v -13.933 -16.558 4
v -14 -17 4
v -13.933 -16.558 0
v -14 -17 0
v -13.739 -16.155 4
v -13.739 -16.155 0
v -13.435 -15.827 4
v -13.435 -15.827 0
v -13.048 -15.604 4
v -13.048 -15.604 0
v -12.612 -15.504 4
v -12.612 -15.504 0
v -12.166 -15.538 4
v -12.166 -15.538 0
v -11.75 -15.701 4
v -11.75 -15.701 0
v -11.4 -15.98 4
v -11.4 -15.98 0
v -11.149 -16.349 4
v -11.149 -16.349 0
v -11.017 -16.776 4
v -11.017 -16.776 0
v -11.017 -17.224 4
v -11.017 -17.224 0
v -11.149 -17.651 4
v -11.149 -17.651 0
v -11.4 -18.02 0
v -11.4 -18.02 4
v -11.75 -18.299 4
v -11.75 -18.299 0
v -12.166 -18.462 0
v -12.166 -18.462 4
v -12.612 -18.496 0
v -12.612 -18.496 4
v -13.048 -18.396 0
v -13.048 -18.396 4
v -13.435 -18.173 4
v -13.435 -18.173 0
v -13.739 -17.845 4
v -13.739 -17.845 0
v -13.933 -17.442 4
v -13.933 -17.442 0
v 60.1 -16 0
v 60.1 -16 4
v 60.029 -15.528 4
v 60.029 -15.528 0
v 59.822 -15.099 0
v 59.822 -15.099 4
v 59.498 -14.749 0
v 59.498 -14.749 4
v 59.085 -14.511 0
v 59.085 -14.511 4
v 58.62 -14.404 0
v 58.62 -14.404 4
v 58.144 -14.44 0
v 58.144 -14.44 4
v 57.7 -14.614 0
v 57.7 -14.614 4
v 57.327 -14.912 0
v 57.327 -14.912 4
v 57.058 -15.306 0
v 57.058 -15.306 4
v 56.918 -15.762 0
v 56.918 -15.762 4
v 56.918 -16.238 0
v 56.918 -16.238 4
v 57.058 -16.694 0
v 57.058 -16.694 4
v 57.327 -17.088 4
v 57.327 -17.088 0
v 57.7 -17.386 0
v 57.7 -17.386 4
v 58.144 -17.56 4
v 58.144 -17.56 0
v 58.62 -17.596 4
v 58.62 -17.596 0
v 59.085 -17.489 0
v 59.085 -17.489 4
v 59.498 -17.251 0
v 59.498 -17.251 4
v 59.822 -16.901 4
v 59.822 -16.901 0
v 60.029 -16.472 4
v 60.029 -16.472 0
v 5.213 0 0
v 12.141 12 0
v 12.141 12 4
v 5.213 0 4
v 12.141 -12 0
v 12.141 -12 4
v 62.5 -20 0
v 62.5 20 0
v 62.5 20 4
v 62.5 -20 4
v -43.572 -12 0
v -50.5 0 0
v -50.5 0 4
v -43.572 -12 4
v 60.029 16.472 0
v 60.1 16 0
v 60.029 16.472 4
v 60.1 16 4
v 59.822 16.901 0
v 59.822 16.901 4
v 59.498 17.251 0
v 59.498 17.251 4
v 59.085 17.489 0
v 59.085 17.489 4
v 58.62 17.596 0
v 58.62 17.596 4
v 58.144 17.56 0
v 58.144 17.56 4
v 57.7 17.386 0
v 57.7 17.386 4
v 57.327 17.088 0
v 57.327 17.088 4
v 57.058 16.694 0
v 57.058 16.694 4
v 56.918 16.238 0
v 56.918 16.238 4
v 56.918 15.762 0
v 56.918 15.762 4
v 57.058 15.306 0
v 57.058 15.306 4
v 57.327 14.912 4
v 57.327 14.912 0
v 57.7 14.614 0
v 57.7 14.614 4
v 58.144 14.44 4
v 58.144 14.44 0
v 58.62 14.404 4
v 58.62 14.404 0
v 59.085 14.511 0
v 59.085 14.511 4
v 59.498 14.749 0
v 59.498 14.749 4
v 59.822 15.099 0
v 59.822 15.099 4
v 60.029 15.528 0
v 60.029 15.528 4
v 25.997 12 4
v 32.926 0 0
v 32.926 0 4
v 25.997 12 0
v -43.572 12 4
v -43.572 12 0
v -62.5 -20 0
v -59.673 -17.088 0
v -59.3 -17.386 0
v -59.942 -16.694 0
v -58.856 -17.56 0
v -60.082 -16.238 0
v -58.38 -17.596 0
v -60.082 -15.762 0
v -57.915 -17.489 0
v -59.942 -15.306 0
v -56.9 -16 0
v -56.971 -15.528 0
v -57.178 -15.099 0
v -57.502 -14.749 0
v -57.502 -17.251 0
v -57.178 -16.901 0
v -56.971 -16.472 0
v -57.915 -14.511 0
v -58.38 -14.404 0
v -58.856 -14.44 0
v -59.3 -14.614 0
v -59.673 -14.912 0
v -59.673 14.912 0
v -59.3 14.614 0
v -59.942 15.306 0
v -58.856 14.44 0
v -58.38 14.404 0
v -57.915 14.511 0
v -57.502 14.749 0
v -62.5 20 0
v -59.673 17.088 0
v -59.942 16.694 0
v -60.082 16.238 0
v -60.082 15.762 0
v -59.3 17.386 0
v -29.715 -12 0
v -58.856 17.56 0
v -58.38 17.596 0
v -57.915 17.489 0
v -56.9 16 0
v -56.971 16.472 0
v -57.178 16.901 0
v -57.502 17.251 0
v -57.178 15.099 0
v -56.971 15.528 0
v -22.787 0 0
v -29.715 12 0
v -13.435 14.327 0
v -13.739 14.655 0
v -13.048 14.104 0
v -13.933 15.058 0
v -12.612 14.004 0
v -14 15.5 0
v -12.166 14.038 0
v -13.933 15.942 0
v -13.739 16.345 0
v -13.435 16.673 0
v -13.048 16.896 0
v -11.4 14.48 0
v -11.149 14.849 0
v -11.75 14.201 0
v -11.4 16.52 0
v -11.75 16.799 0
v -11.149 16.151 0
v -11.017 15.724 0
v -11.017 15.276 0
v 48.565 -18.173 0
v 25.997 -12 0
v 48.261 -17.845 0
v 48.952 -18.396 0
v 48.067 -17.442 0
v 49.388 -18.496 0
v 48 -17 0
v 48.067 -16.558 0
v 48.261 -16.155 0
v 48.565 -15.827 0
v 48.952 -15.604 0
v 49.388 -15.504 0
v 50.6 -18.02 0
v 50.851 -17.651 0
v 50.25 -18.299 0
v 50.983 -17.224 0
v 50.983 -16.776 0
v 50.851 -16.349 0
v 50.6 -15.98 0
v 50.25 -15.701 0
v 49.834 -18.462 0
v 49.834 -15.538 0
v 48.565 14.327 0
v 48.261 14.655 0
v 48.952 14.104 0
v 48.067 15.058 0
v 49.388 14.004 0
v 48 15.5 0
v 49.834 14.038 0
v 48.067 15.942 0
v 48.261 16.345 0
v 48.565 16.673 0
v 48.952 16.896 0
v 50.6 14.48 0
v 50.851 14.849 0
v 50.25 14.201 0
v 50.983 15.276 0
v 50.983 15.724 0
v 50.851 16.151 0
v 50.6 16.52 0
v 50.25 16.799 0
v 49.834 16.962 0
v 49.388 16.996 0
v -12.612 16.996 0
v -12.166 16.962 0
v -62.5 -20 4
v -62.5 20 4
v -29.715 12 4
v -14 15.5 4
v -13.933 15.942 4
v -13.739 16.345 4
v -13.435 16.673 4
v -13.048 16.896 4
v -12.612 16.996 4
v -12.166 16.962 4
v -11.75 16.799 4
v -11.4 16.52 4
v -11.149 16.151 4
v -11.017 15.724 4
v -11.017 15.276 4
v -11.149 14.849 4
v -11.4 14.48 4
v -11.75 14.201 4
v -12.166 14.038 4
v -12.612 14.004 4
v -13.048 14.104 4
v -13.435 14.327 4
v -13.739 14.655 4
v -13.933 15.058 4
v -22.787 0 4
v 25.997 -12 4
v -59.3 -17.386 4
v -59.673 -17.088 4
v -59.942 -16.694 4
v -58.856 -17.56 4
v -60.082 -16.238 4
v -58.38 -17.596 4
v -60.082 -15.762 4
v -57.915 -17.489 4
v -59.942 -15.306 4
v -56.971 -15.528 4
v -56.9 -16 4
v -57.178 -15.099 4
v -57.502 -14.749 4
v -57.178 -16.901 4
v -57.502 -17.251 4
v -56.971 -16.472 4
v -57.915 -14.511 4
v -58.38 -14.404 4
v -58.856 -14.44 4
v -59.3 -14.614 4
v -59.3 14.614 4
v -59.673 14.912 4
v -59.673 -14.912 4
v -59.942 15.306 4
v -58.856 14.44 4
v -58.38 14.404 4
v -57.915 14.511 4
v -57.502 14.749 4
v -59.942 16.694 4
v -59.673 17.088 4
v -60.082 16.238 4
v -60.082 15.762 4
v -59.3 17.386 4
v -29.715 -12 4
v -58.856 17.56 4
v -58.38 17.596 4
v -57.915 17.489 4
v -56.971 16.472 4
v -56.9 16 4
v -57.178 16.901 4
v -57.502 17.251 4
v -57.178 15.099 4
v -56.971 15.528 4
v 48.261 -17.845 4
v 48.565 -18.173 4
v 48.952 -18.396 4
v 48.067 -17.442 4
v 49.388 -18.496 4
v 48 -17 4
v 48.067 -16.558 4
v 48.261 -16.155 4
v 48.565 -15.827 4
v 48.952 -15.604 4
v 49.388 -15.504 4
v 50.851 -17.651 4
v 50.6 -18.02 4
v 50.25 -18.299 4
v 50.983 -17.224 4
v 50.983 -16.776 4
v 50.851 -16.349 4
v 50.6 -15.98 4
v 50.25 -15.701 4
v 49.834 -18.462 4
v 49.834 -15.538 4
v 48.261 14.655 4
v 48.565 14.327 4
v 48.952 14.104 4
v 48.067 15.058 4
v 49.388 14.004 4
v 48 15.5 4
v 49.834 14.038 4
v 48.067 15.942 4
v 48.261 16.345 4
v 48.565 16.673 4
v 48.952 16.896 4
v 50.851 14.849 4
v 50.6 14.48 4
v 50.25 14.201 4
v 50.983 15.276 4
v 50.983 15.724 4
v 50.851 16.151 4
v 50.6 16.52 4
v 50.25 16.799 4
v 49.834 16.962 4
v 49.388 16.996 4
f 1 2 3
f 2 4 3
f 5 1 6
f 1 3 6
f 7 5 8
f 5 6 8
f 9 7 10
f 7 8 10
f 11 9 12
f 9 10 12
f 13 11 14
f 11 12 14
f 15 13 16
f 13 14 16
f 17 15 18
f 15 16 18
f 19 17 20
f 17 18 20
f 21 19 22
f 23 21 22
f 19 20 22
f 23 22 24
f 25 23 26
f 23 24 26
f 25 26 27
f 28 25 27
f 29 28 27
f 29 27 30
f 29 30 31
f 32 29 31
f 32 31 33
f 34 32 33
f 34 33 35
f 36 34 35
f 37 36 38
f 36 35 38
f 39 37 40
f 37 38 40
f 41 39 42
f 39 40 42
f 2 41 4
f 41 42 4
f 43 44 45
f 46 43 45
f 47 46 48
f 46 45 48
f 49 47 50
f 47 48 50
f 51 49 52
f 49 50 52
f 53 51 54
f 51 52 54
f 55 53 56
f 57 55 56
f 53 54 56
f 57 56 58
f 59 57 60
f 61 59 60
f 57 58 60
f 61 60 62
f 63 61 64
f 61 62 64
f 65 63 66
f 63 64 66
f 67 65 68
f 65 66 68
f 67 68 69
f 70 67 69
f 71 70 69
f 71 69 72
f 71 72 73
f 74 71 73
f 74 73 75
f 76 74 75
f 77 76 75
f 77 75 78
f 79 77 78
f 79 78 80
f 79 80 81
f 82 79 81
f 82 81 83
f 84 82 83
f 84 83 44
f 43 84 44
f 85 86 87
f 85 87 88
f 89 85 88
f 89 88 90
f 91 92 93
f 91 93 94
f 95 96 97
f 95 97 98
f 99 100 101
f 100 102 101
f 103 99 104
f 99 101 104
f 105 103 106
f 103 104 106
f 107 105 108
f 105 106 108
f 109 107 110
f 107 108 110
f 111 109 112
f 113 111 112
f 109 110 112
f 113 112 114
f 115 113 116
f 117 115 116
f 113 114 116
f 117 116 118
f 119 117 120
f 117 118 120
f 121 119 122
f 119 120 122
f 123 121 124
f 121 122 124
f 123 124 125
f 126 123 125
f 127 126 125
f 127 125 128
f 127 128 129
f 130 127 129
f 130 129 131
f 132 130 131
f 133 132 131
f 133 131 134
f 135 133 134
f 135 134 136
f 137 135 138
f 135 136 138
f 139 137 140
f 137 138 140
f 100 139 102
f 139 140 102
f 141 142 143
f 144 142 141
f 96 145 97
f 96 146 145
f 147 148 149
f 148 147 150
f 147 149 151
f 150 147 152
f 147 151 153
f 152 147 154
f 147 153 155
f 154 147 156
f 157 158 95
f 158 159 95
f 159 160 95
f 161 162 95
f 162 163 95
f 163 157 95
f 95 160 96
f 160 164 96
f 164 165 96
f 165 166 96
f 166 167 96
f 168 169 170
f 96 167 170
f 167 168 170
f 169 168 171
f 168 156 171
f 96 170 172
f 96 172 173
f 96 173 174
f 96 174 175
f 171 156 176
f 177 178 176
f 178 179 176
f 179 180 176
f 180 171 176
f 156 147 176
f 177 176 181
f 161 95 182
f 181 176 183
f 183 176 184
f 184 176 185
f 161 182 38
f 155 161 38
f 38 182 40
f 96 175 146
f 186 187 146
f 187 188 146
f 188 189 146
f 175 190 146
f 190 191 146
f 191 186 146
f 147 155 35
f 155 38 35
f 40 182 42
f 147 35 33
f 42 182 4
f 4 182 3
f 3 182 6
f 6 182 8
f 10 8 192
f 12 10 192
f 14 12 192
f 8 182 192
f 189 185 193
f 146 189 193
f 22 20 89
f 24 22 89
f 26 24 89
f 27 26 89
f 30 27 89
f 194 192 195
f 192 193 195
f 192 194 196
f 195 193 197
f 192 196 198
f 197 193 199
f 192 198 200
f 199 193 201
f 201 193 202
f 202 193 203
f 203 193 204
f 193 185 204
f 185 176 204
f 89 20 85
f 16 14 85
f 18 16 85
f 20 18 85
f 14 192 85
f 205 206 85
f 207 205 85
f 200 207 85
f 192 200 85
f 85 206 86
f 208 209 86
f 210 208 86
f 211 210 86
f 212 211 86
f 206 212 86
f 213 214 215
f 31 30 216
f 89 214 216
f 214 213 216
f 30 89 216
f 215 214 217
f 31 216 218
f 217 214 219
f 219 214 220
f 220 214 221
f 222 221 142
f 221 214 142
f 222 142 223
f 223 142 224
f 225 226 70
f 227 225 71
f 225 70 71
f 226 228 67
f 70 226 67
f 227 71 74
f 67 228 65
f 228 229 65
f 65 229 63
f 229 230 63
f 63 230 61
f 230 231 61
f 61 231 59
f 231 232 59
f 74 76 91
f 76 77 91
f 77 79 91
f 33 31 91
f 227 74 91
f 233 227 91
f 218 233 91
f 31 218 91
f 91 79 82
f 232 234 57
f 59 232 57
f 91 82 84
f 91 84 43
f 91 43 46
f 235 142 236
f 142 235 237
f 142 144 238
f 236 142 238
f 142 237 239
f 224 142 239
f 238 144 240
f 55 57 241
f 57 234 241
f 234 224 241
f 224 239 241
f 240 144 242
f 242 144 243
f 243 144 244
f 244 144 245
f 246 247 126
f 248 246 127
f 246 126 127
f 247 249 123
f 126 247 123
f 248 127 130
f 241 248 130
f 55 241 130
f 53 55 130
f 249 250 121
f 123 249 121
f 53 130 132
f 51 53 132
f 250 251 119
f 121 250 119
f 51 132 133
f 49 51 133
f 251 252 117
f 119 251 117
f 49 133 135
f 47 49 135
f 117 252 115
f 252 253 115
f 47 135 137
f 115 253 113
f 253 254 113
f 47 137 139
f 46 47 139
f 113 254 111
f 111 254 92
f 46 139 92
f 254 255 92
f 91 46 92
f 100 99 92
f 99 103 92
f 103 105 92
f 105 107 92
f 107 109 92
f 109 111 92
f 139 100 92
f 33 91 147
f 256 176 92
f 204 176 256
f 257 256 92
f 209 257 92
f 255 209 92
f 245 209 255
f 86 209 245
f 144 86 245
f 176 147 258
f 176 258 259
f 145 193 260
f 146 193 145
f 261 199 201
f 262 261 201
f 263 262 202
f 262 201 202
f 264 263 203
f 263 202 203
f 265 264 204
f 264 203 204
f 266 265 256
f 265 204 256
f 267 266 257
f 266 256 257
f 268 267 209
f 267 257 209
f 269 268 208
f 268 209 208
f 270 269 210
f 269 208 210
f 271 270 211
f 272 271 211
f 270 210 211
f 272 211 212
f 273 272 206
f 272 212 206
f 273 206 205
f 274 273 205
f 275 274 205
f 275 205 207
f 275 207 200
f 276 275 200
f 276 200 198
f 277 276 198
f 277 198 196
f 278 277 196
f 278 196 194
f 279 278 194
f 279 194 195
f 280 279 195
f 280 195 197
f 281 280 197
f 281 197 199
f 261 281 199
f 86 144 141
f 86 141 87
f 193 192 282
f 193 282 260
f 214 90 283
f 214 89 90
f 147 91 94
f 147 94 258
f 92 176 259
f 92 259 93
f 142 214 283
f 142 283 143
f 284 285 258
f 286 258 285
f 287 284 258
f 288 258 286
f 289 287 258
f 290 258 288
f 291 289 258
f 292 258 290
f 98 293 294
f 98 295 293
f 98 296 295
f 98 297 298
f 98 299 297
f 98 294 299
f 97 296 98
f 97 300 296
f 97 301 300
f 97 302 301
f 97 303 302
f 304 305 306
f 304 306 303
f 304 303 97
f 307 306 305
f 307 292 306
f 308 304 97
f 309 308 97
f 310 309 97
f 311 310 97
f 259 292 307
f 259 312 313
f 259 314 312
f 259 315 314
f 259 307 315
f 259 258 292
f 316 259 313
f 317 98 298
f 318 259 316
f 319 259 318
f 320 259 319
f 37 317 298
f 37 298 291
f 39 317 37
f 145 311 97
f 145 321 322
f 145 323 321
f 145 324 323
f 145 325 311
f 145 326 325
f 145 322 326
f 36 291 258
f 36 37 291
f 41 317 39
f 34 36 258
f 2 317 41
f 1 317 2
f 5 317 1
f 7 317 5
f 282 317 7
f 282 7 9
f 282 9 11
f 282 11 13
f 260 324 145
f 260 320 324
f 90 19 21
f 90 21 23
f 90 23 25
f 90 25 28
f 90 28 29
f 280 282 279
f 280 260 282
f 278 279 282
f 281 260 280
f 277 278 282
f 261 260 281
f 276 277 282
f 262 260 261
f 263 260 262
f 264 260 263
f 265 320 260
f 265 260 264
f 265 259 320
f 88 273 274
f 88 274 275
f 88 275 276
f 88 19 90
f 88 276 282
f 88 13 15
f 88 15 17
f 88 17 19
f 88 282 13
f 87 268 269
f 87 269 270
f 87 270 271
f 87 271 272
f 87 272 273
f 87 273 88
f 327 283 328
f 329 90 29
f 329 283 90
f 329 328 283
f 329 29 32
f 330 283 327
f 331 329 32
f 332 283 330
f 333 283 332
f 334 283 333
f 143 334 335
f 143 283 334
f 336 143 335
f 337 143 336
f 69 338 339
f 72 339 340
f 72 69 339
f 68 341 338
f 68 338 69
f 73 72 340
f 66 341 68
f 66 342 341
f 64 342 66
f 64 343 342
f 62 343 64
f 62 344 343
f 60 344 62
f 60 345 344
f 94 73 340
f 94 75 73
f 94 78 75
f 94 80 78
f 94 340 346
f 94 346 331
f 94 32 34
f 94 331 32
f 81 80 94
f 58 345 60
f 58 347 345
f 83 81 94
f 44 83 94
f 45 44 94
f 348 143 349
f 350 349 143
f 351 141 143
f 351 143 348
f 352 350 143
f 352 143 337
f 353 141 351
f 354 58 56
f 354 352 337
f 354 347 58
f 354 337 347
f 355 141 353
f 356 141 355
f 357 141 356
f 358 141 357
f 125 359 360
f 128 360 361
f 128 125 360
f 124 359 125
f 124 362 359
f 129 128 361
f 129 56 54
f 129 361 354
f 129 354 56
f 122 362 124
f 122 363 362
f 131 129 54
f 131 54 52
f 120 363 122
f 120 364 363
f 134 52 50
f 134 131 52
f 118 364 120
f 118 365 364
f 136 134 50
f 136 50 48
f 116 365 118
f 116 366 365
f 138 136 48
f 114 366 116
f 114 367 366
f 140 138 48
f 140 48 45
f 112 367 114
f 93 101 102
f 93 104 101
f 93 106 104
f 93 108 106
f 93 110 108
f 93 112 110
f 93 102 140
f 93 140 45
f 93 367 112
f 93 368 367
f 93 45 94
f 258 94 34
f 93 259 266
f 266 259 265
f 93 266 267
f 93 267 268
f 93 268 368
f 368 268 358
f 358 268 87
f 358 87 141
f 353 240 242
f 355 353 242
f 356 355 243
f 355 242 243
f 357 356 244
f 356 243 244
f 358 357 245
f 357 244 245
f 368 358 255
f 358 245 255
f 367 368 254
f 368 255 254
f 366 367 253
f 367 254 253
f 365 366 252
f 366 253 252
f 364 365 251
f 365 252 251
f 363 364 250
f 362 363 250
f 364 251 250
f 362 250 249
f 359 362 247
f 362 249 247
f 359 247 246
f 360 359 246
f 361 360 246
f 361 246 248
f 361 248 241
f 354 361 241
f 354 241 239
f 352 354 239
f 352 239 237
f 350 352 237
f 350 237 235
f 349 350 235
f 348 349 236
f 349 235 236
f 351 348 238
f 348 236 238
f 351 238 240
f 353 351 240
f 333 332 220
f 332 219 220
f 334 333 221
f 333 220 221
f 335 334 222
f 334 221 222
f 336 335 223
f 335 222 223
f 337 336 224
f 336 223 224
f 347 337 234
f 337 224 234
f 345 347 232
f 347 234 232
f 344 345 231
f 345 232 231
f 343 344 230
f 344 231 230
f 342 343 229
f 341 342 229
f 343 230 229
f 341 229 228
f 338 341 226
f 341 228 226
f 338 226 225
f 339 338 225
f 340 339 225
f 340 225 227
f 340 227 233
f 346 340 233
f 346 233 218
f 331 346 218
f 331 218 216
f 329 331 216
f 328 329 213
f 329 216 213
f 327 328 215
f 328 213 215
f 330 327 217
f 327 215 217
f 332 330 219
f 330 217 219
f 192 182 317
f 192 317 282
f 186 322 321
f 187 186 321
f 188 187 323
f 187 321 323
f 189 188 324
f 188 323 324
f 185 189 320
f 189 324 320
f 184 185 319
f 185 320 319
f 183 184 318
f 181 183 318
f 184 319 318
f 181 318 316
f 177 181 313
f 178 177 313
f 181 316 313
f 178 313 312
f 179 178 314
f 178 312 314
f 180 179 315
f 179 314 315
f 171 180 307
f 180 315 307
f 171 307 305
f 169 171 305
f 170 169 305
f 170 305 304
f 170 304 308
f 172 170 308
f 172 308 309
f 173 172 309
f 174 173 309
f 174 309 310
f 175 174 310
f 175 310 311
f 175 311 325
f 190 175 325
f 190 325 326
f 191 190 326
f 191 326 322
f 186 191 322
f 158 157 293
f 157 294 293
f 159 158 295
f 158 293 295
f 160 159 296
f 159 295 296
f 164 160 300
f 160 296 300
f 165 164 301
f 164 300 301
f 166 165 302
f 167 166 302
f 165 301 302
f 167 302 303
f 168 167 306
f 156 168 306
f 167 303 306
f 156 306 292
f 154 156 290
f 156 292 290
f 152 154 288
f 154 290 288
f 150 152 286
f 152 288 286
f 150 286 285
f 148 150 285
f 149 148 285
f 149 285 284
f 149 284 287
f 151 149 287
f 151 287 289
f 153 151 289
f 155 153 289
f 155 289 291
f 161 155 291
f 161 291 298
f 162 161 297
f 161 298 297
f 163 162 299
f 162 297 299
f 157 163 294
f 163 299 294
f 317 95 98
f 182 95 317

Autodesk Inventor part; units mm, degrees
ref_plane "YZ Plane" through (0, 0, 0) normal (1, 0, 0) x (0, 1, 0)
ref_plane "XZ Plane" through (0, 0, 0) normal (0, 1, 0) x (-1, 0, 0)
ref_plane "XY Plane" through (0, 0, 0) normal (0, 0, 1) x (1, 0, 0)
sketch "Эскиз1" plane through (0, 0, 0) normal (0, 0, 1) x (1, 0, 0)
  line L0 (-62.5, 20) -> (62.5, 20)
  line L1 (62.5, 20) -> (62.5, -20)
  line L2 (62.5, -20) -> (-62.5, -20)
  line L3 (-62.5, -20) -> (-62.5, 20)
  line L4 (-62.5, 20) -> (62.5, -20) construction
  line L5 (62.5, 20) -> (-62.5, -20) construction
  point P0 (0, 0)
  dimension "d0" = 125
  dimension "d1" = 40
extrude "Выдавливание1" add sketch "Эскиз1" along normal blind 4
sketch "Эскиз2" plane through (0, 0, 4) normal (0, 0, 1) x (1, 0, 0)
  circle A0 centre (-58.5, 16) radius 1.6
  line L0 (62.5, 20) -> (-62.5, 20) projected
  line L1 (-62.5, 20) -> (-62.5, -20) projected
  line L2 (-62.5, -20) -> (62.5, -20) construction
  line L3 (0, -20) -> (0, 0) construction
  line L4 (62.5, 0) -> (0, 0) construction
  circle A1 centre (58.5, 16) radius 1.6
  circle A2 centre (-58.5, -16) radius 1.6
  circle A3 centre (58.5, -16) radius 1.6
  dimension "d4" = 3.2
  dimension "d5" = 4
  dimension "d6" = 4
extrude "Выдавливание2" cut sketch "Эскиз2" against normal blind 4
sketch "Эскиз3" plane through (0, 0, 0) normal (0, 0, -1) x (-1, 0, 0)
  circle A0 centre (-49.5, 15.5) radius 1.5 projected
  circle A1 centre (-49.5, -17) radius 1.5 projected
  circle A2 centre (12.5, 15.5) radius 1.5 projected
  circle A3 centre (12.5, -17) radius 1.5 projected
  line L0 (29.7154, -12) -> (22.7872, 0)
  line L1 (22.7872, 0) -> (29.7154, 12)
  line L2 (29.7154, 12) -> (43.5718, 12)
  line L3 (43.5718, 12) -> (50.5, 0)
  line L4 (50.5, 0) -> (43.5718, -12)
  line L5 (43.5718, -12) -> (29.7154, -12)
  line L6 (-62.5, 20) -> (62.5, 20) projected
  line L7 (62.5, -20) -> (-62.5, -20) projected
  line L8 (-5.2128, 0) -> (-12.141, -12)
  line L9 (-12.141, -12) -> (-25.9974, -12)
  line L10 (-25.9974, -12) -> (-32.9256, 0)
  line L11 (-32.9256, 0) -> (-25.9974, 12)
  line L12 (-25.9974, 12) -> (-12.141, 12)
  line L13 (-12.141, 12) -> (-5.2128, 0)
  line L14 (62.5, 20) -> (62.5, -20) projected
  point P0 (0, 0)
  point P1 (36.6436, 0)
  point P2 (-19.0692, 0)
  point P3 (-19.0692, -12)
  point P4 (62.5, 0)
  dimension "d10" = 8
  dimension "d11" = 8
  dimension "d12" = 8
  dimension "d13" = 8
  dimension "d14" = 28
  dimension "d15" = 12
extrude "Выдавливание3" cut sketch "Эскиз3" against normal blind 4
properties part number "для_стаба"
